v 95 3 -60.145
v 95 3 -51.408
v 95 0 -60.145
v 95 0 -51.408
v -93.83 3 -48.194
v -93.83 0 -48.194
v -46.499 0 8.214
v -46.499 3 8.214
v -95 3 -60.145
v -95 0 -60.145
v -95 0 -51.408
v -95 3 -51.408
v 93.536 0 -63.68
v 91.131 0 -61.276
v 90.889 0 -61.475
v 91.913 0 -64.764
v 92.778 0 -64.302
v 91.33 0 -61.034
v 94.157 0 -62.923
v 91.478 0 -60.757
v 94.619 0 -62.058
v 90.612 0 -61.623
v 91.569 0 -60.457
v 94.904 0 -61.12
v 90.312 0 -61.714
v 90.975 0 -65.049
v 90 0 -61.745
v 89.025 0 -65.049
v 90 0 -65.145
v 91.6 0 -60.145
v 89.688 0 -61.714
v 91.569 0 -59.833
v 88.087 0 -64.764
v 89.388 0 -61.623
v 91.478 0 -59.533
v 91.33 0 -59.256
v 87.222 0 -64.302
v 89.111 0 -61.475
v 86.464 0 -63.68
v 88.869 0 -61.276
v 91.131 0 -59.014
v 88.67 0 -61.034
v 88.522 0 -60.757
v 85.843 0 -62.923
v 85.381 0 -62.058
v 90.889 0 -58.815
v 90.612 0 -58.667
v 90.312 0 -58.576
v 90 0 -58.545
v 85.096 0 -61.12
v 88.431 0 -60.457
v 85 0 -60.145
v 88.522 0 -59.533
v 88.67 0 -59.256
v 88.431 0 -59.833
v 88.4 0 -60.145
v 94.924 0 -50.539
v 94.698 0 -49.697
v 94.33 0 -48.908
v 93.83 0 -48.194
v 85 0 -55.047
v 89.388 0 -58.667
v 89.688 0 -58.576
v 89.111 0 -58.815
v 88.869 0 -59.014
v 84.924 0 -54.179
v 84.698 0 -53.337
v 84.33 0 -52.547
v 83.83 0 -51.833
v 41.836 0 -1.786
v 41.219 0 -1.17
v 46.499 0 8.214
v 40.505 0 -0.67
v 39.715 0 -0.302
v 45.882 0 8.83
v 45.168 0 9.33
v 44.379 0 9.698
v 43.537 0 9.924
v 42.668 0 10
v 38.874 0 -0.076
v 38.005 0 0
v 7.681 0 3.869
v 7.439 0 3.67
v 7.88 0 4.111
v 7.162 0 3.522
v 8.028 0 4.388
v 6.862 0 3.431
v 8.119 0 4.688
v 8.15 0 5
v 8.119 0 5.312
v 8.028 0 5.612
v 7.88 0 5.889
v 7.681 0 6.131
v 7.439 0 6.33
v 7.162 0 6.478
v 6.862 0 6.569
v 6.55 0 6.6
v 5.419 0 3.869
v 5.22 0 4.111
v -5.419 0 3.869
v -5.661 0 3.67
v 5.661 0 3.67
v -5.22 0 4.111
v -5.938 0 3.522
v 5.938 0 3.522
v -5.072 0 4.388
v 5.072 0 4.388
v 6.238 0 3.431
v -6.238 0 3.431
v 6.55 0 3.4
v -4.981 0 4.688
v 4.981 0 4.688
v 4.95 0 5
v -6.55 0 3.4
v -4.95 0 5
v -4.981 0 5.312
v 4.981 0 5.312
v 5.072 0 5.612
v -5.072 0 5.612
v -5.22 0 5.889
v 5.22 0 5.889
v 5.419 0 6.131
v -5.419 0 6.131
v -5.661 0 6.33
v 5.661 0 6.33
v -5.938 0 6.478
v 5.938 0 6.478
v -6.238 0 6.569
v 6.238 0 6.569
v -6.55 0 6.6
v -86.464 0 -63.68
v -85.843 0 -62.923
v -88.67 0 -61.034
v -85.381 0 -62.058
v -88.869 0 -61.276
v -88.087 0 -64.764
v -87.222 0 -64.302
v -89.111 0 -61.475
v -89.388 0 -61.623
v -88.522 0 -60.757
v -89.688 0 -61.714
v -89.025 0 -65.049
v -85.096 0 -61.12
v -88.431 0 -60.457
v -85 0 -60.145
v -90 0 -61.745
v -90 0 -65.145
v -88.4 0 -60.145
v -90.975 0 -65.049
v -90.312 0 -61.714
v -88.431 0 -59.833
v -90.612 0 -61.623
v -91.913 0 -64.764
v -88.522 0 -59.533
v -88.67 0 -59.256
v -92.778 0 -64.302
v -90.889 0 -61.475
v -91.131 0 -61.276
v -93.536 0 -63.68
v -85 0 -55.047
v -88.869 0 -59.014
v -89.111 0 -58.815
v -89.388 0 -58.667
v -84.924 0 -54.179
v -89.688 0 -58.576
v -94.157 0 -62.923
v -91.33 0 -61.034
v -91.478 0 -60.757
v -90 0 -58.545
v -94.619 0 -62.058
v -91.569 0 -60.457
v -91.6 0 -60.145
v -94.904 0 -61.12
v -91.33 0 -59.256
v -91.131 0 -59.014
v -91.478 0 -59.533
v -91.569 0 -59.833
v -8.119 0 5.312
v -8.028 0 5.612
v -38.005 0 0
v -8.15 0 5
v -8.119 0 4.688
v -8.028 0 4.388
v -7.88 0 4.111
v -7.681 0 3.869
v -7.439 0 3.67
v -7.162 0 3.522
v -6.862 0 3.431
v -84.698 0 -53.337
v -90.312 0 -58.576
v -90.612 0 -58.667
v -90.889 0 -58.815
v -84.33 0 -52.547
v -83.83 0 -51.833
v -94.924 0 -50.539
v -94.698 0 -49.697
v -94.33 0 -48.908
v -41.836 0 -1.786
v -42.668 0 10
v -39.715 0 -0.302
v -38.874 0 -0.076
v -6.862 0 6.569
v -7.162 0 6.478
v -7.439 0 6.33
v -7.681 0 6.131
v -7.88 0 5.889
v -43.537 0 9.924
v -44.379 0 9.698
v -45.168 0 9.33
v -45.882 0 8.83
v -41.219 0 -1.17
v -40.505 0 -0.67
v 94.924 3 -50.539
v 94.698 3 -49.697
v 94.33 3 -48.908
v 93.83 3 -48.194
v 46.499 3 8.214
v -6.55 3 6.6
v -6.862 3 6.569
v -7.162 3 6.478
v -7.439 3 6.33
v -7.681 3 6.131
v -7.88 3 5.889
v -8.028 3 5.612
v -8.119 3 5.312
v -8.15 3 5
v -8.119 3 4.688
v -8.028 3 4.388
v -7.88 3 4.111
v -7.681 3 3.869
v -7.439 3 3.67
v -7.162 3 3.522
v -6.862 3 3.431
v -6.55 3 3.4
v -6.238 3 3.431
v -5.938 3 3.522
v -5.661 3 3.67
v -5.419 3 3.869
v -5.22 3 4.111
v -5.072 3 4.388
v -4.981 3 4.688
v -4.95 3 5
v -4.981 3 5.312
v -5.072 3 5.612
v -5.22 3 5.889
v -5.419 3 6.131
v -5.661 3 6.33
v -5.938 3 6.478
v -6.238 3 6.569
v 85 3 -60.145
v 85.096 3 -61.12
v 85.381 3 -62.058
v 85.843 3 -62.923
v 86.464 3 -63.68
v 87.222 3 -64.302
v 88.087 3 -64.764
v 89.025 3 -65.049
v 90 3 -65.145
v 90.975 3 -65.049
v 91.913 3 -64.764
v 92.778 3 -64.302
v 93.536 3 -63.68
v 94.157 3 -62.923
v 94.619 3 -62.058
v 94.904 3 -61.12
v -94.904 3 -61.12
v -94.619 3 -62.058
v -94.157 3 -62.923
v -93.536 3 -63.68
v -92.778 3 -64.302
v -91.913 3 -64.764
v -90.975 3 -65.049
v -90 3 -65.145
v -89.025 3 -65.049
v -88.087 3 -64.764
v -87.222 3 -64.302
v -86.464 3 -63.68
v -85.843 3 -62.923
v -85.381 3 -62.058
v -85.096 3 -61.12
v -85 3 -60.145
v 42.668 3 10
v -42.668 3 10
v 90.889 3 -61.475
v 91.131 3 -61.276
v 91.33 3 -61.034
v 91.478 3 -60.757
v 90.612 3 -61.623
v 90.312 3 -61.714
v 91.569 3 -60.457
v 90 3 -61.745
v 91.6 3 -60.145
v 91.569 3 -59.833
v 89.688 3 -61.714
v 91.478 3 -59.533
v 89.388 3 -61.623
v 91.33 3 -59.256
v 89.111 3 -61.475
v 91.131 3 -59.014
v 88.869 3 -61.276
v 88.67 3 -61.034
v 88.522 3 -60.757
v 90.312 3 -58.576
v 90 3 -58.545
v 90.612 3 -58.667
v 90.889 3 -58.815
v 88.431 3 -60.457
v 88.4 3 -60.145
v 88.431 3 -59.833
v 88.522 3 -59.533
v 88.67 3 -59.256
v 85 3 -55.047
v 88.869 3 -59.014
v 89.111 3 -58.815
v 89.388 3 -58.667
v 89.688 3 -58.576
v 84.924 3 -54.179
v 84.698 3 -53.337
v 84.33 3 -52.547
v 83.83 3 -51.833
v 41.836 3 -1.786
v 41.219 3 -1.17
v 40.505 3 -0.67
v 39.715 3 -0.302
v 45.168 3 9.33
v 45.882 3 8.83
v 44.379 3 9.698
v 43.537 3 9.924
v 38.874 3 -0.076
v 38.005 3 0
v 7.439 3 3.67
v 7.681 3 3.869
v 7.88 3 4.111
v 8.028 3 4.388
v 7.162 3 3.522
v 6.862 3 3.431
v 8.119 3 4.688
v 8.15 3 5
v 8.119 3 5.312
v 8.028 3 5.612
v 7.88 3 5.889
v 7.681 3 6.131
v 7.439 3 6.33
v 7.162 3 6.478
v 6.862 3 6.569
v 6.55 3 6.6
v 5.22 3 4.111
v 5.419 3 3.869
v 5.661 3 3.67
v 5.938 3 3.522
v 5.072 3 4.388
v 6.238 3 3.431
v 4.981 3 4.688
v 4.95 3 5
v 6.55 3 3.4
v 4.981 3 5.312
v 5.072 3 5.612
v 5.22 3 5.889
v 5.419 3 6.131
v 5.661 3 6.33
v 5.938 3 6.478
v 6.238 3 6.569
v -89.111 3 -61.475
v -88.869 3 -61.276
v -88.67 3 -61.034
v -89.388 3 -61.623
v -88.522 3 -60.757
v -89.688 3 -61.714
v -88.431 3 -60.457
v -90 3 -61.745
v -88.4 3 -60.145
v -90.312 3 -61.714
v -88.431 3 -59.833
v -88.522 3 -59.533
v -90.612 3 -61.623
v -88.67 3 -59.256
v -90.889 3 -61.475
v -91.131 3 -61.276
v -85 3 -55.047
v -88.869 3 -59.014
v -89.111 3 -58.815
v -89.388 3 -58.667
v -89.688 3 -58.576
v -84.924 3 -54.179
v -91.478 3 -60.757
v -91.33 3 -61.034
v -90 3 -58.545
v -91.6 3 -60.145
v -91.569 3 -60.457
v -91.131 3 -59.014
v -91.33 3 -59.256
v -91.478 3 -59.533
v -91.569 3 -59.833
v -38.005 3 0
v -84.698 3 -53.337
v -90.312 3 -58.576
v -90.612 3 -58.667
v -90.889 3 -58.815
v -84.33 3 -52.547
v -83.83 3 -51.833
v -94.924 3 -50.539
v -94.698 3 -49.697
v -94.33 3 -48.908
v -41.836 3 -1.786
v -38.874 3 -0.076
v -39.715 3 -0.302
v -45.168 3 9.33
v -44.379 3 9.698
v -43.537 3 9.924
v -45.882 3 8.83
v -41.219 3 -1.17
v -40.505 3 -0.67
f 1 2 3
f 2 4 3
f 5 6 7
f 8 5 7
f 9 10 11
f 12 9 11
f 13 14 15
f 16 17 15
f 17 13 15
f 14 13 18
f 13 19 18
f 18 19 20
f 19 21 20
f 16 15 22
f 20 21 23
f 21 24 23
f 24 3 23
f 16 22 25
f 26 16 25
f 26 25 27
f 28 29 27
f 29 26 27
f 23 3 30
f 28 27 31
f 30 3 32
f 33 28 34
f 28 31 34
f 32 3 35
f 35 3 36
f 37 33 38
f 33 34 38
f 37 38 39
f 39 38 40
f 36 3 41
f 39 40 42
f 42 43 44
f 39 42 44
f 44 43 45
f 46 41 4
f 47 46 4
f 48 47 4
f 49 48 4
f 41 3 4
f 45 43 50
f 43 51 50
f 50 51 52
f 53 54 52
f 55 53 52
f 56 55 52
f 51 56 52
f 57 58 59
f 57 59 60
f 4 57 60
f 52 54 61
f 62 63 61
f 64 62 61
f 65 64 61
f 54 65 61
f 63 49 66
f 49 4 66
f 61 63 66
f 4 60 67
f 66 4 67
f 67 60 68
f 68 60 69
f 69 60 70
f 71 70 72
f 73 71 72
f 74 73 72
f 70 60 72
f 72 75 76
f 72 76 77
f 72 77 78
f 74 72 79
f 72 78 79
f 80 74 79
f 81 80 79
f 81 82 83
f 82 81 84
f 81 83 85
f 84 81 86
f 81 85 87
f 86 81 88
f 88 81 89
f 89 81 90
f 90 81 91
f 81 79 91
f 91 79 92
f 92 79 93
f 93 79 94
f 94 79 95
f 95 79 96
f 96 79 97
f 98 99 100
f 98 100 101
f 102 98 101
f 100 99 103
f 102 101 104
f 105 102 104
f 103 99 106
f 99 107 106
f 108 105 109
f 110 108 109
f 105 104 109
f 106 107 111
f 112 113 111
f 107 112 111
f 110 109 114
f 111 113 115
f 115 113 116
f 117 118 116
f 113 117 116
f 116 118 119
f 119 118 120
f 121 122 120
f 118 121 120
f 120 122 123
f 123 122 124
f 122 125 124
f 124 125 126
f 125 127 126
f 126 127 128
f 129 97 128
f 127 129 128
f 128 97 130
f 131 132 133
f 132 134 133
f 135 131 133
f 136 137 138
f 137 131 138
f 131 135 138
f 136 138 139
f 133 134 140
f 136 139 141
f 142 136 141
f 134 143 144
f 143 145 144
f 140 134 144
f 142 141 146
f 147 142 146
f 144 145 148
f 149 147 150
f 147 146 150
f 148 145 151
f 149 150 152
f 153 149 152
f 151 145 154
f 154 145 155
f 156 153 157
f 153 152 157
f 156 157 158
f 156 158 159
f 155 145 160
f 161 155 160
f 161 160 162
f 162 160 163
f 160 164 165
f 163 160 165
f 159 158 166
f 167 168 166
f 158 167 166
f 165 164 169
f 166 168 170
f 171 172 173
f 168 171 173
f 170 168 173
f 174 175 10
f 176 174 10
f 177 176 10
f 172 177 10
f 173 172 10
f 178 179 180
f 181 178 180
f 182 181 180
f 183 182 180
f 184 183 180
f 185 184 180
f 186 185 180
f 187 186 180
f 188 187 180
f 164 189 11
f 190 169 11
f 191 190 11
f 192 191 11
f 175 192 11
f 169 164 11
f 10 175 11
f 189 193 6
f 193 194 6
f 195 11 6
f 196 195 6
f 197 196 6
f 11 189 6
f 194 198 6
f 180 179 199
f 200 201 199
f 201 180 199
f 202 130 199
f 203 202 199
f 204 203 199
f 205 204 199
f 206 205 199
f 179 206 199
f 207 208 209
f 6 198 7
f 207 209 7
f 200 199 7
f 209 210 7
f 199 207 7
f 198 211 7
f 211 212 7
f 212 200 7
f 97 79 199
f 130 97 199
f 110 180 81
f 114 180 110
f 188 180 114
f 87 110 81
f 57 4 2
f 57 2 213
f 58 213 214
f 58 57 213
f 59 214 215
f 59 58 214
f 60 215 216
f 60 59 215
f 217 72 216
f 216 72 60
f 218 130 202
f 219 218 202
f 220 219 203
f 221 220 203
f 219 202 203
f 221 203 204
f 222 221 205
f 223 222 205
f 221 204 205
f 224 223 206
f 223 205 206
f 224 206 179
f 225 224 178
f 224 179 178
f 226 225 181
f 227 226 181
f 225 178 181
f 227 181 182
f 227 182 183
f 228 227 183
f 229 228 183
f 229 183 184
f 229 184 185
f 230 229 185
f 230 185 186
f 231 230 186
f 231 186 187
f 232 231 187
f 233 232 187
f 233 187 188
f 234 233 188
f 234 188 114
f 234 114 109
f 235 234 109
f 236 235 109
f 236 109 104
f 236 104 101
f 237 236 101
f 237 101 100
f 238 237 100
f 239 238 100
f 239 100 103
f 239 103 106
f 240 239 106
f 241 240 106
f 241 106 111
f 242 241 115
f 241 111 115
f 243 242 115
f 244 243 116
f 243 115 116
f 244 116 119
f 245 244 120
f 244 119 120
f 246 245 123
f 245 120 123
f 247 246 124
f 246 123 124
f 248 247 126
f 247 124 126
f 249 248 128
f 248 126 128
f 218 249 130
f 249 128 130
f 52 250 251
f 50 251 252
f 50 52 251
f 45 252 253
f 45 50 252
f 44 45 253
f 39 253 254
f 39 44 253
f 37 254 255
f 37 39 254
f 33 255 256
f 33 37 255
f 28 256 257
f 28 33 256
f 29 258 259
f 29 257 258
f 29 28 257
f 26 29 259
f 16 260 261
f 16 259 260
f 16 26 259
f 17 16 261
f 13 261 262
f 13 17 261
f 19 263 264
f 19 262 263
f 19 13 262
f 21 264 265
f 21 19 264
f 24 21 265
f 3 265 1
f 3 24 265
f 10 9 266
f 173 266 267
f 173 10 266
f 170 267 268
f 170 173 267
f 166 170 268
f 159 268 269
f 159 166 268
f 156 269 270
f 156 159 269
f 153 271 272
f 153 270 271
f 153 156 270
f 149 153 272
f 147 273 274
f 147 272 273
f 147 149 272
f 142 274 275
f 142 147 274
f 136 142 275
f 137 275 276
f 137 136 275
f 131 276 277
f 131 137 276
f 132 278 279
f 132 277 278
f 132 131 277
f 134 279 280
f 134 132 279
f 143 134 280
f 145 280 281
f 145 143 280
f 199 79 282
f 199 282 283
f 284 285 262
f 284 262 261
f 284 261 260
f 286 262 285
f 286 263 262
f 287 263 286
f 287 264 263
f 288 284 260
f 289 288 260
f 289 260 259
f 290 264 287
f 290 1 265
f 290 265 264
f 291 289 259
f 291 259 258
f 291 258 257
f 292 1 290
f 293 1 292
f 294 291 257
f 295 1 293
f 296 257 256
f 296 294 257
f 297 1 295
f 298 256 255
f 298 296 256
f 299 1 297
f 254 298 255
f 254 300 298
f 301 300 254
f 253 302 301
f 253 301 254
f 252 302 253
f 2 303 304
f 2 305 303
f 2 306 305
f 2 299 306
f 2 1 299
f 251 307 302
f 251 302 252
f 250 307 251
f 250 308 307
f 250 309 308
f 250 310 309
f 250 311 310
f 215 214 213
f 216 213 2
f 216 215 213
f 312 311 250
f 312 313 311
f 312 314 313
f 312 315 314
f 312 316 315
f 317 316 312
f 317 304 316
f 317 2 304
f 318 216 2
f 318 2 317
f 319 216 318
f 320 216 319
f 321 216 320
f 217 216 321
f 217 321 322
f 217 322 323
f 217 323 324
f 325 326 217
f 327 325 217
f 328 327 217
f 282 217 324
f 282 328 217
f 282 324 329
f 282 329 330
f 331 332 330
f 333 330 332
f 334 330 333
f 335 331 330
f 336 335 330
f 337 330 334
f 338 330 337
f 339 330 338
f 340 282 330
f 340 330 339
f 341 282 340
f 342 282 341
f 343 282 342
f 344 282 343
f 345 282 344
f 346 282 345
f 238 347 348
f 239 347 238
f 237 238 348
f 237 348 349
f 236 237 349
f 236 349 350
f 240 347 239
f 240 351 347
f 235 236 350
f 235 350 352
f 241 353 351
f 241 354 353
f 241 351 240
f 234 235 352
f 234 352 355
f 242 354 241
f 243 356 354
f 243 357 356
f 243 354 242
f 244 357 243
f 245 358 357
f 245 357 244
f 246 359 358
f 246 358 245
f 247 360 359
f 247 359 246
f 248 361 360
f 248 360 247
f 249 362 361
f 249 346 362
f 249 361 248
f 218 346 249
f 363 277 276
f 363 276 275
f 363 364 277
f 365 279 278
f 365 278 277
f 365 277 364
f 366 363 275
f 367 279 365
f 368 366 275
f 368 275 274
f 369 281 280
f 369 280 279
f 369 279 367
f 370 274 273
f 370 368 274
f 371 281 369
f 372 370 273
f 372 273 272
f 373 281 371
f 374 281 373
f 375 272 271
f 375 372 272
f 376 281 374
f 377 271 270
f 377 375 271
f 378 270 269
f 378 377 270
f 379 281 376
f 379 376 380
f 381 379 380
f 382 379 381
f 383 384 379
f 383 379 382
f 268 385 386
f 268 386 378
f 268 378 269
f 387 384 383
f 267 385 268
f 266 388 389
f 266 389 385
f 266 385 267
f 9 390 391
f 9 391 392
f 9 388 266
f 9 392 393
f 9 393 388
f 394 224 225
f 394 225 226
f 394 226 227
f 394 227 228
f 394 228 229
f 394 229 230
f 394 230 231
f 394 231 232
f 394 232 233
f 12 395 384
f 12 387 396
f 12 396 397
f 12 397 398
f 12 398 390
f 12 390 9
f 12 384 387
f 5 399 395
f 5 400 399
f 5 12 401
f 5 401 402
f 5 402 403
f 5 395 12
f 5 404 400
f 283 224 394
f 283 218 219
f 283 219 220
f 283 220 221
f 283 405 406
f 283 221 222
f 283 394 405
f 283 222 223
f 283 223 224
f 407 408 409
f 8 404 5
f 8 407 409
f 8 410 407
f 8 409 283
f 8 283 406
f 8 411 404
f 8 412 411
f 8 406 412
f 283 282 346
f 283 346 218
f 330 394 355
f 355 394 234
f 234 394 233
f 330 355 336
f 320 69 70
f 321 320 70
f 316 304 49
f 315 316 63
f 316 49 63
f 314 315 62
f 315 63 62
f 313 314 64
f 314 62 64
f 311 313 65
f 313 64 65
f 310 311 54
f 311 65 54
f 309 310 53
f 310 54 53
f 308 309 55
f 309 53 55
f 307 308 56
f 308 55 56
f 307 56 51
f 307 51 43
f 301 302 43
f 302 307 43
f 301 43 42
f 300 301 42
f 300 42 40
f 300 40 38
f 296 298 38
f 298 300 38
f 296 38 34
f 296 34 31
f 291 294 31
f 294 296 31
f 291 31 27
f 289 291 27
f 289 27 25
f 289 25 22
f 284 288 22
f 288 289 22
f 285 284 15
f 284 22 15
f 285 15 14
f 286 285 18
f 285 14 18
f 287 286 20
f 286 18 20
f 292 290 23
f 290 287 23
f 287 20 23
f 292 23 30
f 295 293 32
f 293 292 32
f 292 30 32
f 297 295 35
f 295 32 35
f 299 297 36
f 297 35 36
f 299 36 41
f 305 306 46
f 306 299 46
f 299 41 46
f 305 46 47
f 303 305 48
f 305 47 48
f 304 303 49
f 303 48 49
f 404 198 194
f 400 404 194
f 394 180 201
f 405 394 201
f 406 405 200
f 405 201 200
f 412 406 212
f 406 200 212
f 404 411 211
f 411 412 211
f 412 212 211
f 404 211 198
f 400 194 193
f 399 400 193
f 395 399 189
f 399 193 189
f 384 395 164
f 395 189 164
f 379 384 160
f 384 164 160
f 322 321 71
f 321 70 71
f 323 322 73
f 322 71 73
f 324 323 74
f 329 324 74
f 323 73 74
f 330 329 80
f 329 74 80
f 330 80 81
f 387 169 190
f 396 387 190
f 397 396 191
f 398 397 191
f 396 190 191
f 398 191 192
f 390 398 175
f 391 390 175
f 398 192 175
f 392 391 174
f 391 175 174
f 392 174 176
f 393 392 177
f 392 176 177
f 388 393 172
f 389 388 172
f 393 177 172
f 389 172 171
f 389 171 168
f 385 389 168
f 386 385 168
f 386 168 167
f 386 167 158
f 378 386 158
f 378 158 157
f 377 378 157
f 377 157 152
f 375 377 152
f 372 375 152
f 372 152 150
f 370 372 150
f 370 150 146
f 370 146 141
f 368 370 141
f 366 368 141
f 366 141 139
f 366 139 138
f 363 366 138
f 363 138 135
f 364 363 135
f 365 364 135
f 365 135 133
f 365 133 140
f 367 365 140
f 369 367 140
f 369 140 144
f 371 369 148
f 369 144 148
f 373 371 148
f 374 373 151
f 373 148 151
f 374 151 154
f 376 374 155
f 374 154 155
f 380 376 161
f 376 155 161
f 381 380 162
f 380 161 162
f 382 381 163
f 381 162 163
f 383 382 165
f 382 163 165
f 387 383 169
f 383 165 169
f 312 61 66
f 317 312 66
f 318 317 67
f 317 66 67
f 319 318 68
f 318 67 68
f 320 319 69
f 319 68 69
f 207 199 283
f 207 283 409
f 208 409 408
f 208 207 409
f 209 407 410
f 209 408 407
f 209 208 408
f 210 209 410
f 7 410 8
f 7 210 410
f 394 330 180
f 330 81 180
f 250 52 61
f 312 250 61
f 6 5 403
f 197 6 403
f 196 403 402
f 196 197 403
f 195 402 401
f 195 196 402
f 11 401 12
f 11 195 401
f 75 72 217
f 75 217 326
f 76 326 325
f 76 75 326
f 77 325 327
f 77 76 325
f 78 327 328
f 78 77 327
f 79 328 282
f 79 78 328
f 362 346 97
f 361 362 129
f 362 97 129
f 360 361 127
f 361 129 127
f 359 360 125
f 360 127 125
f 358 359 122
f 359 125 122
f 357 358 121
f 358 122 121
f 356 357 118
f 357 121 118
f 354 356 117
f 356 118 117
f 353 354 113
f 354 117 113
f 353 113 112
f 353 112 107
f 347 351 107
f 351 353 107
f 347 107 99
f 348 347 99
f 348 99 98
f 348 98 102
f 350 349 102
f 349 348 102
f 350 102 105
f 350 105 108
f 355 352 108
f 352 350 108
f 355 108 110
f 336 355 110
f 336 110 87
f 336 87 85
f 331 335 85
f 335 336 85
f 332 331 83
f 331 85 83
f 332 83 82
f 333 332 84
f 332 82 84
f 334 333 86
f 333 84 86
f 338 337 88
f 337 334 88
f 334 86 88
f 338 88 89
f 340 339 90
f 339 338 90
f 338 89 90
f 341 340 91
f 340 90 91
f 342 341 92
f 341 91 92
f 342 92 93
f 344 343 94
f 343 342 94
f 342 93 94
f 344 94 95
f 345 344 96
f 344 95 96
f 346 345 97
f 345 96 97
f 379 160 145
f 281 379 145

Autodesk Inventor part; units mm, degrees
ref_plane "YZ Plane" through (0, 0, 0) normal (1, 0, 0) x (0, 1, 0)
ref_plane "XZ Plane" through (0, 0, 0) normal (0, 1, 0) x (-1, 0, 0)
ref_plane "XY Plane" through (0, 0, 0) normal (0, 0, 1) x (1, 0, 0)
sketch "Sketch1" plane through (0, 0, 0) normal (0, 1, 0) x (-1, 0, 0)
  line L0 (0, 0) -> (0, 10)
  line L1 (0, 10) -> (42.6685, 10)
  line L2 (0, 0) -> (38.0054, 0)
  line L3 (41.8356, -1.7861) -> (83.8302, -51.8333)
  line L4 (85, -55.0472) -> (85, -60.1449)
  line L5 (90, -65.1449) -> (90, -65.1449)
  line L6 (95, -60.1449) -> (95, -51.4075)
  line L7 (93.8302, -48.1936) -> (46.4987, 8.2139)
  arc A0 (45.5995, 9.2856) -> (44.0674, 10) centre (44.0674, 8) ccw
  arc A1 (41.8356, -1.7861) -> (38.0054, 0) centre (38.0054, -5) ccw
  arc A2 (85, -55.0472) -> (83.8302, -51.8333) centre (80, -55.0472) ccw
  arc A3 (95, -51.4075) -> (93.8302, -48.1936) centre (90, -51.4075) ccw
  arc A4 (46.4987, 8.2139) -> (42.6685, 10) centre (42.6685, 5) ccw
  arc A5 (90, -65.1449) -> (95, -60.1449) centre (90, -60.1449) ccw
  arc A6 (85, -60.1449) -> (90, -65.1449) centre (90, -60.1449) ccw
  point P0 (85, -65.1449)
  point P1 (95, -65.1449)
  point P2 (45, 10)
  point P3 (90, -65.1449)
  dimension "d1" = 130
  dimension "d2" = 140
  dimension "d3" = 45
  dimension "d4" = 50
  dimension "d5" = 10
  dimension "d6" = 10
  dimension "d7" = 10
  dimension "d8" = 2
  dimension "d9" = 5
extrude "Extrusion1" add sketch "Sketch1" along normal blind 3
sketch "Sketch2" plane through (0, 3, 0) normal (0, 1, 0) x (1, 0, 0)
  line L0 (0, -10) -> (0, 0) projected
  line L1 (0, -5) -> (-25.3234, -5) construction
  arc A0 (-85, 60.1449) -> (-95, 60.1449) centre (-90, 60.1449) ccw projected
  point P0 (-6.55, -5)
  dimension "d19" = 6.55
hole "Hole1" at (-6.55, 3, 5) at (-90, 3, -60.1449) direction (0, -1, 0) diameter 3.2 end through all clearance for "Countersunk Flat Head Screw DIN EN ISO 2009" size "M3" standard "DIN"
mirror "Mirror1" about plane through (0, 0, 0) normal (1, 0, 0) of "Extrusion1", "Hole1"
properties part number "Claw1" material "Copper, Cast"
